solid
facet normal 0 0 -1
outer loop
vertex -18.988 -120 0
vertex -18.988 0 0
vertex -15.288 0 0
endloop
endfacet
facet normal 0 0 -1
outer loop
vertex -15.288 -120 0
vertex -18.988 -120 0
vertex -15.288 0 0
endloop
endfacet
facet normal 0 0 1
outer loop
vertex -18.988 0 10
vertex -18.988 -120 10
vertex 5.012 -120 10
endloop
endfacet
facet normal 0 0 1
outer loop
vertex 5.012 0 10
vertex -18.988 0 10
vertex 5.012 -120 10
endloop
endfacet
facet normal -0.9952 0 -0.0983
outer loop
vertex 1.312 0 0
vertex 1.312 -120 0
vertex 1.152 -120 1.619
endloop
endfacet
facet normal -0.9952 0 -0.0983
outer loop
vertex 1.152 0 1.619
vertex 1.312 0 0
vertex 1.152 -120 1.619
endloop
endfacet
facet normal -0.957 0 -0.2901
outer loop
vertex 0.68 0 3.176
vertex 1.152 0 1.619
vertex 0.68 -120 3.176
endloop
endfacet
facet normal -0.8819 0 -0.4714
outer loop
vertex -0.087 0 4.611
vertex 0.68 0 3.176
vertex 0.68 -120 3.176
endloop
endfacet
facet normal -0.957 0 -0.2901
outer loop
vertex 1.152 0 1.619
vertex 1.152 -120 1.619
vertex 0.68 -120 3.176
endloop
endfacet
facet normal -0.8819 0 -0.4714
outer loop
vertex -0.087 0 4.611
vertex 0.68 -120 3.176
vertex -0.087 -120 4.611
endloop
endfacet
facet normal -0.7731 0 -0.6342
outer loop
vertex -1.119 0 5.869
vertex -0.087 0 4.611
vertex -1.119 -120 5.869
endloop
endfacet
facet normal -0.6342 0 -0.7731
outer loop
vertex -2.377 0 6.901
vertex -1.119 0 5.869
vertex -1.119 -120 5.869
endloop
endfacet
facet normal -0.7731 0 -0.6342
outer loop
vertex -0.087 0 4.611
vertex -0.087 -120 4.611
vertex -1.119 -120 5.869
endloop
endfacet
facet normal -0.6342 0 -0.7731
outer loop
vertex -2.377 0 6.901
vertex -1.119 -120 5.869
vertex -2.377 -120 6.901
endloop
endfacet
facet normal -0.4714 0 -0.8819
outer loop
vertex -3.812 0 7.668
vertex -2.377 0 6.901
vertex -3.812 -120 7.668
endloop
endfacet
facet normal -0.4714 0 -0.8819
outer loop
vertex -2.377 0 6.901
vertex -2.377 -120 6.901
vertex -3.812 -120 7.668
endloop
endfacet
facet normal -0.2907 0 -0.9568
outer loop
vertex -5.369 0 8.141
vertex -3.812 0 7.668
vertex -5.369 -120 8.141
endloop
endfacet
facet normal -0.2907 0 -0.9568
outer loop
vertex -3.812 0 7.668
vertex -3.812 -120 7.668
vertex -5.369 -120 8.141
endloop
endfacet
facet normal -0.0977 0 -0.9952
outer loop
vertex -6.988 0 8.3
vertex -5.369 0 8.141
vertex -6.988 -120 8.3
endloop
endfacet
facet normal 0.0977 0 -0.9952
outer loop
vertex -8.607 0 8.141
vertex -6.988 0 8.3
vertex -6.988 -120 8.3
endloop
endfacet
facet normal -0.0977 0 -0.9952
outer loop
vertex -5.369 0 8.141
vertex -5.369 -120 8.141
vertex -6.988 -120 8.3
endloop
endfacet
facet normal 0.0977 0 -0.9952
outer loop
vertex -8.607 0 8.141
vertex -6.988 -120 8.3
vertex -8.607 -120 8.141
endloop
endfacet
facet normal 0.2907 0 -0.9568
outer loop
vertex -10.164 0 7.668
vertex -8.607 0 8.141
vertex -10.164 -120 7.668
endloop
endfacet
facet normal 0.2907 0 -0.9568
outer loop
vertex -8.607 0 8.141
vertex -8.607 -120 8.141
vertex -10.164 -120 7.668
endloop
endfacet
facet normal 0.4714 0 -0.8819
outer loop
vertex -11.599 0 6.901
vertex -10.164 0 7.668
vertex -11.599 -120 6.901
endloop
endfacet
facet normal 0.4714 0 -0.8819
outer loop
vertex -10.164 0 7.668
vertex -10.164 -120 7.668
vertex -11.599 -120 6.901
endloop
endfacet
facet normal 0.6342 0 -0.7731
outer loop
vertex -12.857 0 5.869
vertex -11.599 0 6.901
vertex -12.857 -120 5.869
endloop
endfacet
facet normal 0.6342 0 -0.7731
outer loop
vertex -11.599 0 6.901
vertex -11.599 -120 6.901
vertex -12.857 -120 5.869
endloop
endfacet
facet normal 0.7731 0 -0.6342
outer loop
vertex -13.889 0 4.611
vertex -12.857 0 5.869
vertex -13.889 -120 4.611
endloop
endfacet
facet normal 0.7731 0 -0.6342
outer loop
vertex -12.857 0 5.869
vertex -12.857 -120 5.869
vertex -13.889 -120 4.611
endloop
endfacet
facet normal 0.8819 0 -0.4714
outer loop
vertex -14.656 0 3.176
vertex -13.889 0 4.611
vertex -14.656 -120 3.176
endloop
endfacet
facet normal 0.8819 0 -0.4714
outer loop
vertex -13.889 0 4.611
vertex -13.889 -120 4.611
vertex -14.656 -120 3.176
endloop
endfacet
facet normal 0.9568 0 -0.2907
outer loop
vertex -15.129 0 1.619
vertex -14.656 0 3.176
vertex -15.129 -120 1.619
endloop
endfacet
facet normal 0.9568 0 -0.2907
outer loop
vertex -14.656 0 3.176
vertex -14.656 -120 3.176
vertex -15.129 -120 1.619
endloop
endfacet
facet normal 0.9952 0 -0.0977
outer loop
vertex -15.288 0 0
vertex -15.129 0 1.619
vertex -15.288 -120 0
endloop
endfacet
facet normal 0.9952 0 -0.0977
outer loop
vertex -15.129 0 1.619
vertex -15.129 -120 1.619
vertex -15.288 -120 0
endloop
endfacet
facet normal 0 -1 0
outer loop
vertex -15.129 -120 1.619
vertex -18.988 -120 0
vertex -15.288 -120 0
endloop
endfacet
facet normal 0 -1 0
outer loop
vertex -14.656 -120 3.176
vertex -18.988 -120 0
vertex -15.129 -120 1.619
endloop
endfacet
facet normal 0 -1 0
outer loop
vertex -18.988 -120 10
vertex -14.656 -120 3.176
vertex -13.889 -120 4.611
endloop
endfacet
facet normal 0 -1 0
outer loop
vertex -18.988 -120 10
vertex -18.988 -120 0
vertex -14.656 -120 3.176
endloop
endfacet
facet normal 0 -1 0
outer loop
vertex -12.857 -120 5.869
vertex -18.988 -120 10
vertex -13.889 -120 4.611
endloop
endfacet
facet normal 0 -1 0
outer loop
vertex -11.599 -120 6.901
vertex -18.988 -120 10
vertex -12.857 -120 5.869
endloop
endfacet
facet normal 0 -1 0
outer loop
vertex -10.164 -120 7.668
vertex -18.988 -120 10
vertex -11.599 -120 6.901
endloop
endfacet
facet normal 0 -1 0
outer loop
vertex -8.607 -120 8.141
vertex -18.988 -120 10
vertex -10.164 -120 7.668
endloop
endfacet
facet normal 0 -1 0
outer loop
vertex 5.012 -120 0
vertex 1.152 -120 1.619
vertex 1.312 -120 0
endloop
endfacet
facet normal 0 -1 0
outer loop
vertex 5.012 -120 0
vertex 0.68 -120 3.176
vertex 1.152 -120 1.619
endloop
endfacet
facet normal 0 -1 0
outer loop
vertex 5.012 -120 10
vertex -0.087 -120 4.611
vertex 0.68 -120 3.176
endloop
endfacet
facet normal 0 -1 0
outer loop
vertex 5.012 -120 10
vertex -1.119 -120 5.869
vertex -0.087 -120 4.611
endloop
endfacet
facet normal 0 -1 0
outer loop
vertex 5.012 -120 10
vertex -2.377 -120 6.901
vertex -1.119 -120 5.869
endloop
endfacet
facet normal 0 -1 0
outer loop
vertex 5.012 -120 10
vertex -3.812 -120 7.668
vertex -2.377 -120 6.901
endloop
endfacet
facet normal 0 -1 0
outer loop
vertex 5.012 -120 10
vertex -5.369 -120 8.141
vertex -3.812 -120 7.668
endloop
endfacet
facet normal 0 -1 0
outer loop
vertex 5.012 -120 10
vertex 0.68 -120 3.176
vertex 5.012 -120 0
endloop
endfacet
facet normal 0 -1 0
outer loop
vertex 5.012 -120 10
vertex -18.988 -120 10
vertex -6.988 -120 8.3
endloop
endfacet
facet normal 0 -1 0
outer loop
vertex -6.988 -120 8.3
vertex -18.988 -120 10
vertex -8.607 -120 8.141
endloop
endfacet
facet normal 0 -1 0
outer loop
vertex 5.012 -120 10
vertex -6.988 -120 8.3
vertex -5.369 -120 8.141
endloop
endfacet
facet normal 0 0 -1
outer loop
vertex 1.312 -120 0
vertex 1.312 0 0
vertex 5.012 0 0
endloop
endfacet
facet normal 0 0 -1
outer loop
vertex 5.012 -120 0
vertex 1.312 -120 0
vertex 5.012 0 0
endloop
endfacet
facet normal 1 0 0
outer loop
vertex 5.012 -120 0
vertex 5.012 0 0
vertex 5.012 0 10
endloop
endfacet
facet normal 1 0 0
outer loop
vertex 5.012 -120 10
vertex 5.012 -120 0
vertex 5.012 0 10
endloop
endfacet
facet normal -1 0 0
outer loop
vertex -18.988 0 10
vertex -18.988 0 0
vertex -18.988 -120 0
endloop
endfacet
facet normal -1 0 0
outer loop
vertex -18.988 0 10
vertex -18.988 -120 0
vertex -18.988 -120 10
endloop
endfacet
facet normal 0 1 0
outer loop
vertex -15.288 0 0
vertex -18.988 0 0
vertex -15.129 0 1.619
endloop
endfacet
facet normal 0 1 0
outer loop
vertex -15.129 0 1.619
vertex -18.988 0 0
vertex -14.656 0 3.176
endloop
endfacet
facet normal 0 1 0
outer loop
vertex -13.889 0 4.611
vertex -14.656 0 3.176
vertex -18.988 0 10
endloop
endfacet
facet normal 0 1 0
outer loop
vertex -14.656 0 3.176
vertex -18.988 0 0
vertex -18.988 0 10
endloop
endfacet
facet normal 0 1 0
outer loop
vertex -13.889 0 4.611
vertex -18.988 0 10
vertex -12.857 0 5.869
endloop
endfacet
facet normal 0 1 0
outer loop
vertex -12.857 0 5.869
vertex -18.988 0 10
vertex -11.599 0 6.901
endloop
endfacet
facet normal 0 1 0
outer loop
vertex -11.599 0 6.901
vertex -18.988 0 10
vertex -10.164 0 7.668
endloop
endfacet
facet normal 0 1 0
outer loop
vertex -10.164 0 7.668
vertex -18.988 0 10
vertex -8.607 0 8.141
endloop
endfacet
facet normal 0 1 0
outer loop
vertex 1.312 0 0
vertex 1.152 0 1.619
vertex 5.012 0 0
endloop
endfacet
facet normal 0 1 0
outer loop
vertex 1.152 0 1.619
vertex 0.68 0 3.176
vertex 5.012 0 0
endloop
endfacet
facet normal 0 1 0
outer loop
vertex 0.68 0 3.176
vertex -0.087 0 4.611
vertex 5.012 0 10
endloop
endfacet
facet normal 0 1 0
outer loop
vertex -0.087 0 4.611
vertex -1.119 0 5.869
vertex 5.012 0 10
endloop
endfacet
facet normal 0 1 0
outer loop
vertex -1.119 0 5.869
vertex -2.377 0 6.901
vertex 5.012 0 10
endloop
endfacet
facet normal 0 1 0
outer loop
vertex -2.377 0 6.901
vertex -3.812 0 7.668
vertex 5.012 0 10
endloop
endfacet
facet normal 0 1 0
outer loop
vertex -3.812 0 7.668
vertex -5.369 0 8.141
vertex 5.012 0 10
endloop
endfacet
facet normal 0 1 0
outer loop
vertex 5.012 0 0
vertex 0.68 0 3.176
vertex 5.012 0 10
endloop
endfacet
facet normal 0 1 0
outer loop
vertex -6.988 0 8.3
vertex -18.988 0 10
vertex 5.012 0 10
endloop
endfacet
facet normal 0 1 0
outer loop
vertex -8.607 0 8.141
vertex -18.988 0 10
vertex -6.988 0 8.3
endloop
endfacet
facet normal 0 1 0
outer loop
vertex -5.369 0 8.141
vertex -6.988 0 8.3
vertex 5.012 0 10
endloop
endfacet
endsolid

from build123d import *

# Parameters (mm, degrees)
F0_W     = 24
F0_H     = 24
F1_DEPTH = 120
F2_R     = 8.3
F3_DEPTH = 250
F4_W     = 28.767977
F4_H     = 14
F4_W_2   = 2.367542
F4_W_3   = 2.400435
F4_W_4   = 24
F5_DEPTH = 250


with BuildPart() as f1:
    # F0 (on Front) → F1 (new body)
    with BuildSketch(Plane.XZ):
        with Locations((-6.988064, 12)):
            Rectangle(F0_W, F0_H)
    extrude(amount=F1_DEPTH)

    # F2 (on face) → F3 (cut)
    with BuildSketch(Plane.XZ.offset(120)):
        with Locations((-6.988064, 0)):
            Circle(F2_R)
    extrude(amount=-F3_DEPTH, mode=Mode.SUBTRACT)

    # F4 (on face) → F5 (cut)
    with BuildSketch(Plane.XZ.offset(120)):
        with Locations((-7.004511, 17)):
            Rectangle(F4_W, F4_H)
        with Locations((6.195707, 17)):
            Rectangle(F4_W_2, F4_H)
        with Locations((-20.188281, 17)):
            Rectangle(F4_W_3, F4_H)
        with Locations((-6.988064, 17)):
            Rectangle(F4_W_4, F4_H)
    extrude(amount=-F5_DEPTH, mode=Mode.SUBTRACT)


solid = f1.part
